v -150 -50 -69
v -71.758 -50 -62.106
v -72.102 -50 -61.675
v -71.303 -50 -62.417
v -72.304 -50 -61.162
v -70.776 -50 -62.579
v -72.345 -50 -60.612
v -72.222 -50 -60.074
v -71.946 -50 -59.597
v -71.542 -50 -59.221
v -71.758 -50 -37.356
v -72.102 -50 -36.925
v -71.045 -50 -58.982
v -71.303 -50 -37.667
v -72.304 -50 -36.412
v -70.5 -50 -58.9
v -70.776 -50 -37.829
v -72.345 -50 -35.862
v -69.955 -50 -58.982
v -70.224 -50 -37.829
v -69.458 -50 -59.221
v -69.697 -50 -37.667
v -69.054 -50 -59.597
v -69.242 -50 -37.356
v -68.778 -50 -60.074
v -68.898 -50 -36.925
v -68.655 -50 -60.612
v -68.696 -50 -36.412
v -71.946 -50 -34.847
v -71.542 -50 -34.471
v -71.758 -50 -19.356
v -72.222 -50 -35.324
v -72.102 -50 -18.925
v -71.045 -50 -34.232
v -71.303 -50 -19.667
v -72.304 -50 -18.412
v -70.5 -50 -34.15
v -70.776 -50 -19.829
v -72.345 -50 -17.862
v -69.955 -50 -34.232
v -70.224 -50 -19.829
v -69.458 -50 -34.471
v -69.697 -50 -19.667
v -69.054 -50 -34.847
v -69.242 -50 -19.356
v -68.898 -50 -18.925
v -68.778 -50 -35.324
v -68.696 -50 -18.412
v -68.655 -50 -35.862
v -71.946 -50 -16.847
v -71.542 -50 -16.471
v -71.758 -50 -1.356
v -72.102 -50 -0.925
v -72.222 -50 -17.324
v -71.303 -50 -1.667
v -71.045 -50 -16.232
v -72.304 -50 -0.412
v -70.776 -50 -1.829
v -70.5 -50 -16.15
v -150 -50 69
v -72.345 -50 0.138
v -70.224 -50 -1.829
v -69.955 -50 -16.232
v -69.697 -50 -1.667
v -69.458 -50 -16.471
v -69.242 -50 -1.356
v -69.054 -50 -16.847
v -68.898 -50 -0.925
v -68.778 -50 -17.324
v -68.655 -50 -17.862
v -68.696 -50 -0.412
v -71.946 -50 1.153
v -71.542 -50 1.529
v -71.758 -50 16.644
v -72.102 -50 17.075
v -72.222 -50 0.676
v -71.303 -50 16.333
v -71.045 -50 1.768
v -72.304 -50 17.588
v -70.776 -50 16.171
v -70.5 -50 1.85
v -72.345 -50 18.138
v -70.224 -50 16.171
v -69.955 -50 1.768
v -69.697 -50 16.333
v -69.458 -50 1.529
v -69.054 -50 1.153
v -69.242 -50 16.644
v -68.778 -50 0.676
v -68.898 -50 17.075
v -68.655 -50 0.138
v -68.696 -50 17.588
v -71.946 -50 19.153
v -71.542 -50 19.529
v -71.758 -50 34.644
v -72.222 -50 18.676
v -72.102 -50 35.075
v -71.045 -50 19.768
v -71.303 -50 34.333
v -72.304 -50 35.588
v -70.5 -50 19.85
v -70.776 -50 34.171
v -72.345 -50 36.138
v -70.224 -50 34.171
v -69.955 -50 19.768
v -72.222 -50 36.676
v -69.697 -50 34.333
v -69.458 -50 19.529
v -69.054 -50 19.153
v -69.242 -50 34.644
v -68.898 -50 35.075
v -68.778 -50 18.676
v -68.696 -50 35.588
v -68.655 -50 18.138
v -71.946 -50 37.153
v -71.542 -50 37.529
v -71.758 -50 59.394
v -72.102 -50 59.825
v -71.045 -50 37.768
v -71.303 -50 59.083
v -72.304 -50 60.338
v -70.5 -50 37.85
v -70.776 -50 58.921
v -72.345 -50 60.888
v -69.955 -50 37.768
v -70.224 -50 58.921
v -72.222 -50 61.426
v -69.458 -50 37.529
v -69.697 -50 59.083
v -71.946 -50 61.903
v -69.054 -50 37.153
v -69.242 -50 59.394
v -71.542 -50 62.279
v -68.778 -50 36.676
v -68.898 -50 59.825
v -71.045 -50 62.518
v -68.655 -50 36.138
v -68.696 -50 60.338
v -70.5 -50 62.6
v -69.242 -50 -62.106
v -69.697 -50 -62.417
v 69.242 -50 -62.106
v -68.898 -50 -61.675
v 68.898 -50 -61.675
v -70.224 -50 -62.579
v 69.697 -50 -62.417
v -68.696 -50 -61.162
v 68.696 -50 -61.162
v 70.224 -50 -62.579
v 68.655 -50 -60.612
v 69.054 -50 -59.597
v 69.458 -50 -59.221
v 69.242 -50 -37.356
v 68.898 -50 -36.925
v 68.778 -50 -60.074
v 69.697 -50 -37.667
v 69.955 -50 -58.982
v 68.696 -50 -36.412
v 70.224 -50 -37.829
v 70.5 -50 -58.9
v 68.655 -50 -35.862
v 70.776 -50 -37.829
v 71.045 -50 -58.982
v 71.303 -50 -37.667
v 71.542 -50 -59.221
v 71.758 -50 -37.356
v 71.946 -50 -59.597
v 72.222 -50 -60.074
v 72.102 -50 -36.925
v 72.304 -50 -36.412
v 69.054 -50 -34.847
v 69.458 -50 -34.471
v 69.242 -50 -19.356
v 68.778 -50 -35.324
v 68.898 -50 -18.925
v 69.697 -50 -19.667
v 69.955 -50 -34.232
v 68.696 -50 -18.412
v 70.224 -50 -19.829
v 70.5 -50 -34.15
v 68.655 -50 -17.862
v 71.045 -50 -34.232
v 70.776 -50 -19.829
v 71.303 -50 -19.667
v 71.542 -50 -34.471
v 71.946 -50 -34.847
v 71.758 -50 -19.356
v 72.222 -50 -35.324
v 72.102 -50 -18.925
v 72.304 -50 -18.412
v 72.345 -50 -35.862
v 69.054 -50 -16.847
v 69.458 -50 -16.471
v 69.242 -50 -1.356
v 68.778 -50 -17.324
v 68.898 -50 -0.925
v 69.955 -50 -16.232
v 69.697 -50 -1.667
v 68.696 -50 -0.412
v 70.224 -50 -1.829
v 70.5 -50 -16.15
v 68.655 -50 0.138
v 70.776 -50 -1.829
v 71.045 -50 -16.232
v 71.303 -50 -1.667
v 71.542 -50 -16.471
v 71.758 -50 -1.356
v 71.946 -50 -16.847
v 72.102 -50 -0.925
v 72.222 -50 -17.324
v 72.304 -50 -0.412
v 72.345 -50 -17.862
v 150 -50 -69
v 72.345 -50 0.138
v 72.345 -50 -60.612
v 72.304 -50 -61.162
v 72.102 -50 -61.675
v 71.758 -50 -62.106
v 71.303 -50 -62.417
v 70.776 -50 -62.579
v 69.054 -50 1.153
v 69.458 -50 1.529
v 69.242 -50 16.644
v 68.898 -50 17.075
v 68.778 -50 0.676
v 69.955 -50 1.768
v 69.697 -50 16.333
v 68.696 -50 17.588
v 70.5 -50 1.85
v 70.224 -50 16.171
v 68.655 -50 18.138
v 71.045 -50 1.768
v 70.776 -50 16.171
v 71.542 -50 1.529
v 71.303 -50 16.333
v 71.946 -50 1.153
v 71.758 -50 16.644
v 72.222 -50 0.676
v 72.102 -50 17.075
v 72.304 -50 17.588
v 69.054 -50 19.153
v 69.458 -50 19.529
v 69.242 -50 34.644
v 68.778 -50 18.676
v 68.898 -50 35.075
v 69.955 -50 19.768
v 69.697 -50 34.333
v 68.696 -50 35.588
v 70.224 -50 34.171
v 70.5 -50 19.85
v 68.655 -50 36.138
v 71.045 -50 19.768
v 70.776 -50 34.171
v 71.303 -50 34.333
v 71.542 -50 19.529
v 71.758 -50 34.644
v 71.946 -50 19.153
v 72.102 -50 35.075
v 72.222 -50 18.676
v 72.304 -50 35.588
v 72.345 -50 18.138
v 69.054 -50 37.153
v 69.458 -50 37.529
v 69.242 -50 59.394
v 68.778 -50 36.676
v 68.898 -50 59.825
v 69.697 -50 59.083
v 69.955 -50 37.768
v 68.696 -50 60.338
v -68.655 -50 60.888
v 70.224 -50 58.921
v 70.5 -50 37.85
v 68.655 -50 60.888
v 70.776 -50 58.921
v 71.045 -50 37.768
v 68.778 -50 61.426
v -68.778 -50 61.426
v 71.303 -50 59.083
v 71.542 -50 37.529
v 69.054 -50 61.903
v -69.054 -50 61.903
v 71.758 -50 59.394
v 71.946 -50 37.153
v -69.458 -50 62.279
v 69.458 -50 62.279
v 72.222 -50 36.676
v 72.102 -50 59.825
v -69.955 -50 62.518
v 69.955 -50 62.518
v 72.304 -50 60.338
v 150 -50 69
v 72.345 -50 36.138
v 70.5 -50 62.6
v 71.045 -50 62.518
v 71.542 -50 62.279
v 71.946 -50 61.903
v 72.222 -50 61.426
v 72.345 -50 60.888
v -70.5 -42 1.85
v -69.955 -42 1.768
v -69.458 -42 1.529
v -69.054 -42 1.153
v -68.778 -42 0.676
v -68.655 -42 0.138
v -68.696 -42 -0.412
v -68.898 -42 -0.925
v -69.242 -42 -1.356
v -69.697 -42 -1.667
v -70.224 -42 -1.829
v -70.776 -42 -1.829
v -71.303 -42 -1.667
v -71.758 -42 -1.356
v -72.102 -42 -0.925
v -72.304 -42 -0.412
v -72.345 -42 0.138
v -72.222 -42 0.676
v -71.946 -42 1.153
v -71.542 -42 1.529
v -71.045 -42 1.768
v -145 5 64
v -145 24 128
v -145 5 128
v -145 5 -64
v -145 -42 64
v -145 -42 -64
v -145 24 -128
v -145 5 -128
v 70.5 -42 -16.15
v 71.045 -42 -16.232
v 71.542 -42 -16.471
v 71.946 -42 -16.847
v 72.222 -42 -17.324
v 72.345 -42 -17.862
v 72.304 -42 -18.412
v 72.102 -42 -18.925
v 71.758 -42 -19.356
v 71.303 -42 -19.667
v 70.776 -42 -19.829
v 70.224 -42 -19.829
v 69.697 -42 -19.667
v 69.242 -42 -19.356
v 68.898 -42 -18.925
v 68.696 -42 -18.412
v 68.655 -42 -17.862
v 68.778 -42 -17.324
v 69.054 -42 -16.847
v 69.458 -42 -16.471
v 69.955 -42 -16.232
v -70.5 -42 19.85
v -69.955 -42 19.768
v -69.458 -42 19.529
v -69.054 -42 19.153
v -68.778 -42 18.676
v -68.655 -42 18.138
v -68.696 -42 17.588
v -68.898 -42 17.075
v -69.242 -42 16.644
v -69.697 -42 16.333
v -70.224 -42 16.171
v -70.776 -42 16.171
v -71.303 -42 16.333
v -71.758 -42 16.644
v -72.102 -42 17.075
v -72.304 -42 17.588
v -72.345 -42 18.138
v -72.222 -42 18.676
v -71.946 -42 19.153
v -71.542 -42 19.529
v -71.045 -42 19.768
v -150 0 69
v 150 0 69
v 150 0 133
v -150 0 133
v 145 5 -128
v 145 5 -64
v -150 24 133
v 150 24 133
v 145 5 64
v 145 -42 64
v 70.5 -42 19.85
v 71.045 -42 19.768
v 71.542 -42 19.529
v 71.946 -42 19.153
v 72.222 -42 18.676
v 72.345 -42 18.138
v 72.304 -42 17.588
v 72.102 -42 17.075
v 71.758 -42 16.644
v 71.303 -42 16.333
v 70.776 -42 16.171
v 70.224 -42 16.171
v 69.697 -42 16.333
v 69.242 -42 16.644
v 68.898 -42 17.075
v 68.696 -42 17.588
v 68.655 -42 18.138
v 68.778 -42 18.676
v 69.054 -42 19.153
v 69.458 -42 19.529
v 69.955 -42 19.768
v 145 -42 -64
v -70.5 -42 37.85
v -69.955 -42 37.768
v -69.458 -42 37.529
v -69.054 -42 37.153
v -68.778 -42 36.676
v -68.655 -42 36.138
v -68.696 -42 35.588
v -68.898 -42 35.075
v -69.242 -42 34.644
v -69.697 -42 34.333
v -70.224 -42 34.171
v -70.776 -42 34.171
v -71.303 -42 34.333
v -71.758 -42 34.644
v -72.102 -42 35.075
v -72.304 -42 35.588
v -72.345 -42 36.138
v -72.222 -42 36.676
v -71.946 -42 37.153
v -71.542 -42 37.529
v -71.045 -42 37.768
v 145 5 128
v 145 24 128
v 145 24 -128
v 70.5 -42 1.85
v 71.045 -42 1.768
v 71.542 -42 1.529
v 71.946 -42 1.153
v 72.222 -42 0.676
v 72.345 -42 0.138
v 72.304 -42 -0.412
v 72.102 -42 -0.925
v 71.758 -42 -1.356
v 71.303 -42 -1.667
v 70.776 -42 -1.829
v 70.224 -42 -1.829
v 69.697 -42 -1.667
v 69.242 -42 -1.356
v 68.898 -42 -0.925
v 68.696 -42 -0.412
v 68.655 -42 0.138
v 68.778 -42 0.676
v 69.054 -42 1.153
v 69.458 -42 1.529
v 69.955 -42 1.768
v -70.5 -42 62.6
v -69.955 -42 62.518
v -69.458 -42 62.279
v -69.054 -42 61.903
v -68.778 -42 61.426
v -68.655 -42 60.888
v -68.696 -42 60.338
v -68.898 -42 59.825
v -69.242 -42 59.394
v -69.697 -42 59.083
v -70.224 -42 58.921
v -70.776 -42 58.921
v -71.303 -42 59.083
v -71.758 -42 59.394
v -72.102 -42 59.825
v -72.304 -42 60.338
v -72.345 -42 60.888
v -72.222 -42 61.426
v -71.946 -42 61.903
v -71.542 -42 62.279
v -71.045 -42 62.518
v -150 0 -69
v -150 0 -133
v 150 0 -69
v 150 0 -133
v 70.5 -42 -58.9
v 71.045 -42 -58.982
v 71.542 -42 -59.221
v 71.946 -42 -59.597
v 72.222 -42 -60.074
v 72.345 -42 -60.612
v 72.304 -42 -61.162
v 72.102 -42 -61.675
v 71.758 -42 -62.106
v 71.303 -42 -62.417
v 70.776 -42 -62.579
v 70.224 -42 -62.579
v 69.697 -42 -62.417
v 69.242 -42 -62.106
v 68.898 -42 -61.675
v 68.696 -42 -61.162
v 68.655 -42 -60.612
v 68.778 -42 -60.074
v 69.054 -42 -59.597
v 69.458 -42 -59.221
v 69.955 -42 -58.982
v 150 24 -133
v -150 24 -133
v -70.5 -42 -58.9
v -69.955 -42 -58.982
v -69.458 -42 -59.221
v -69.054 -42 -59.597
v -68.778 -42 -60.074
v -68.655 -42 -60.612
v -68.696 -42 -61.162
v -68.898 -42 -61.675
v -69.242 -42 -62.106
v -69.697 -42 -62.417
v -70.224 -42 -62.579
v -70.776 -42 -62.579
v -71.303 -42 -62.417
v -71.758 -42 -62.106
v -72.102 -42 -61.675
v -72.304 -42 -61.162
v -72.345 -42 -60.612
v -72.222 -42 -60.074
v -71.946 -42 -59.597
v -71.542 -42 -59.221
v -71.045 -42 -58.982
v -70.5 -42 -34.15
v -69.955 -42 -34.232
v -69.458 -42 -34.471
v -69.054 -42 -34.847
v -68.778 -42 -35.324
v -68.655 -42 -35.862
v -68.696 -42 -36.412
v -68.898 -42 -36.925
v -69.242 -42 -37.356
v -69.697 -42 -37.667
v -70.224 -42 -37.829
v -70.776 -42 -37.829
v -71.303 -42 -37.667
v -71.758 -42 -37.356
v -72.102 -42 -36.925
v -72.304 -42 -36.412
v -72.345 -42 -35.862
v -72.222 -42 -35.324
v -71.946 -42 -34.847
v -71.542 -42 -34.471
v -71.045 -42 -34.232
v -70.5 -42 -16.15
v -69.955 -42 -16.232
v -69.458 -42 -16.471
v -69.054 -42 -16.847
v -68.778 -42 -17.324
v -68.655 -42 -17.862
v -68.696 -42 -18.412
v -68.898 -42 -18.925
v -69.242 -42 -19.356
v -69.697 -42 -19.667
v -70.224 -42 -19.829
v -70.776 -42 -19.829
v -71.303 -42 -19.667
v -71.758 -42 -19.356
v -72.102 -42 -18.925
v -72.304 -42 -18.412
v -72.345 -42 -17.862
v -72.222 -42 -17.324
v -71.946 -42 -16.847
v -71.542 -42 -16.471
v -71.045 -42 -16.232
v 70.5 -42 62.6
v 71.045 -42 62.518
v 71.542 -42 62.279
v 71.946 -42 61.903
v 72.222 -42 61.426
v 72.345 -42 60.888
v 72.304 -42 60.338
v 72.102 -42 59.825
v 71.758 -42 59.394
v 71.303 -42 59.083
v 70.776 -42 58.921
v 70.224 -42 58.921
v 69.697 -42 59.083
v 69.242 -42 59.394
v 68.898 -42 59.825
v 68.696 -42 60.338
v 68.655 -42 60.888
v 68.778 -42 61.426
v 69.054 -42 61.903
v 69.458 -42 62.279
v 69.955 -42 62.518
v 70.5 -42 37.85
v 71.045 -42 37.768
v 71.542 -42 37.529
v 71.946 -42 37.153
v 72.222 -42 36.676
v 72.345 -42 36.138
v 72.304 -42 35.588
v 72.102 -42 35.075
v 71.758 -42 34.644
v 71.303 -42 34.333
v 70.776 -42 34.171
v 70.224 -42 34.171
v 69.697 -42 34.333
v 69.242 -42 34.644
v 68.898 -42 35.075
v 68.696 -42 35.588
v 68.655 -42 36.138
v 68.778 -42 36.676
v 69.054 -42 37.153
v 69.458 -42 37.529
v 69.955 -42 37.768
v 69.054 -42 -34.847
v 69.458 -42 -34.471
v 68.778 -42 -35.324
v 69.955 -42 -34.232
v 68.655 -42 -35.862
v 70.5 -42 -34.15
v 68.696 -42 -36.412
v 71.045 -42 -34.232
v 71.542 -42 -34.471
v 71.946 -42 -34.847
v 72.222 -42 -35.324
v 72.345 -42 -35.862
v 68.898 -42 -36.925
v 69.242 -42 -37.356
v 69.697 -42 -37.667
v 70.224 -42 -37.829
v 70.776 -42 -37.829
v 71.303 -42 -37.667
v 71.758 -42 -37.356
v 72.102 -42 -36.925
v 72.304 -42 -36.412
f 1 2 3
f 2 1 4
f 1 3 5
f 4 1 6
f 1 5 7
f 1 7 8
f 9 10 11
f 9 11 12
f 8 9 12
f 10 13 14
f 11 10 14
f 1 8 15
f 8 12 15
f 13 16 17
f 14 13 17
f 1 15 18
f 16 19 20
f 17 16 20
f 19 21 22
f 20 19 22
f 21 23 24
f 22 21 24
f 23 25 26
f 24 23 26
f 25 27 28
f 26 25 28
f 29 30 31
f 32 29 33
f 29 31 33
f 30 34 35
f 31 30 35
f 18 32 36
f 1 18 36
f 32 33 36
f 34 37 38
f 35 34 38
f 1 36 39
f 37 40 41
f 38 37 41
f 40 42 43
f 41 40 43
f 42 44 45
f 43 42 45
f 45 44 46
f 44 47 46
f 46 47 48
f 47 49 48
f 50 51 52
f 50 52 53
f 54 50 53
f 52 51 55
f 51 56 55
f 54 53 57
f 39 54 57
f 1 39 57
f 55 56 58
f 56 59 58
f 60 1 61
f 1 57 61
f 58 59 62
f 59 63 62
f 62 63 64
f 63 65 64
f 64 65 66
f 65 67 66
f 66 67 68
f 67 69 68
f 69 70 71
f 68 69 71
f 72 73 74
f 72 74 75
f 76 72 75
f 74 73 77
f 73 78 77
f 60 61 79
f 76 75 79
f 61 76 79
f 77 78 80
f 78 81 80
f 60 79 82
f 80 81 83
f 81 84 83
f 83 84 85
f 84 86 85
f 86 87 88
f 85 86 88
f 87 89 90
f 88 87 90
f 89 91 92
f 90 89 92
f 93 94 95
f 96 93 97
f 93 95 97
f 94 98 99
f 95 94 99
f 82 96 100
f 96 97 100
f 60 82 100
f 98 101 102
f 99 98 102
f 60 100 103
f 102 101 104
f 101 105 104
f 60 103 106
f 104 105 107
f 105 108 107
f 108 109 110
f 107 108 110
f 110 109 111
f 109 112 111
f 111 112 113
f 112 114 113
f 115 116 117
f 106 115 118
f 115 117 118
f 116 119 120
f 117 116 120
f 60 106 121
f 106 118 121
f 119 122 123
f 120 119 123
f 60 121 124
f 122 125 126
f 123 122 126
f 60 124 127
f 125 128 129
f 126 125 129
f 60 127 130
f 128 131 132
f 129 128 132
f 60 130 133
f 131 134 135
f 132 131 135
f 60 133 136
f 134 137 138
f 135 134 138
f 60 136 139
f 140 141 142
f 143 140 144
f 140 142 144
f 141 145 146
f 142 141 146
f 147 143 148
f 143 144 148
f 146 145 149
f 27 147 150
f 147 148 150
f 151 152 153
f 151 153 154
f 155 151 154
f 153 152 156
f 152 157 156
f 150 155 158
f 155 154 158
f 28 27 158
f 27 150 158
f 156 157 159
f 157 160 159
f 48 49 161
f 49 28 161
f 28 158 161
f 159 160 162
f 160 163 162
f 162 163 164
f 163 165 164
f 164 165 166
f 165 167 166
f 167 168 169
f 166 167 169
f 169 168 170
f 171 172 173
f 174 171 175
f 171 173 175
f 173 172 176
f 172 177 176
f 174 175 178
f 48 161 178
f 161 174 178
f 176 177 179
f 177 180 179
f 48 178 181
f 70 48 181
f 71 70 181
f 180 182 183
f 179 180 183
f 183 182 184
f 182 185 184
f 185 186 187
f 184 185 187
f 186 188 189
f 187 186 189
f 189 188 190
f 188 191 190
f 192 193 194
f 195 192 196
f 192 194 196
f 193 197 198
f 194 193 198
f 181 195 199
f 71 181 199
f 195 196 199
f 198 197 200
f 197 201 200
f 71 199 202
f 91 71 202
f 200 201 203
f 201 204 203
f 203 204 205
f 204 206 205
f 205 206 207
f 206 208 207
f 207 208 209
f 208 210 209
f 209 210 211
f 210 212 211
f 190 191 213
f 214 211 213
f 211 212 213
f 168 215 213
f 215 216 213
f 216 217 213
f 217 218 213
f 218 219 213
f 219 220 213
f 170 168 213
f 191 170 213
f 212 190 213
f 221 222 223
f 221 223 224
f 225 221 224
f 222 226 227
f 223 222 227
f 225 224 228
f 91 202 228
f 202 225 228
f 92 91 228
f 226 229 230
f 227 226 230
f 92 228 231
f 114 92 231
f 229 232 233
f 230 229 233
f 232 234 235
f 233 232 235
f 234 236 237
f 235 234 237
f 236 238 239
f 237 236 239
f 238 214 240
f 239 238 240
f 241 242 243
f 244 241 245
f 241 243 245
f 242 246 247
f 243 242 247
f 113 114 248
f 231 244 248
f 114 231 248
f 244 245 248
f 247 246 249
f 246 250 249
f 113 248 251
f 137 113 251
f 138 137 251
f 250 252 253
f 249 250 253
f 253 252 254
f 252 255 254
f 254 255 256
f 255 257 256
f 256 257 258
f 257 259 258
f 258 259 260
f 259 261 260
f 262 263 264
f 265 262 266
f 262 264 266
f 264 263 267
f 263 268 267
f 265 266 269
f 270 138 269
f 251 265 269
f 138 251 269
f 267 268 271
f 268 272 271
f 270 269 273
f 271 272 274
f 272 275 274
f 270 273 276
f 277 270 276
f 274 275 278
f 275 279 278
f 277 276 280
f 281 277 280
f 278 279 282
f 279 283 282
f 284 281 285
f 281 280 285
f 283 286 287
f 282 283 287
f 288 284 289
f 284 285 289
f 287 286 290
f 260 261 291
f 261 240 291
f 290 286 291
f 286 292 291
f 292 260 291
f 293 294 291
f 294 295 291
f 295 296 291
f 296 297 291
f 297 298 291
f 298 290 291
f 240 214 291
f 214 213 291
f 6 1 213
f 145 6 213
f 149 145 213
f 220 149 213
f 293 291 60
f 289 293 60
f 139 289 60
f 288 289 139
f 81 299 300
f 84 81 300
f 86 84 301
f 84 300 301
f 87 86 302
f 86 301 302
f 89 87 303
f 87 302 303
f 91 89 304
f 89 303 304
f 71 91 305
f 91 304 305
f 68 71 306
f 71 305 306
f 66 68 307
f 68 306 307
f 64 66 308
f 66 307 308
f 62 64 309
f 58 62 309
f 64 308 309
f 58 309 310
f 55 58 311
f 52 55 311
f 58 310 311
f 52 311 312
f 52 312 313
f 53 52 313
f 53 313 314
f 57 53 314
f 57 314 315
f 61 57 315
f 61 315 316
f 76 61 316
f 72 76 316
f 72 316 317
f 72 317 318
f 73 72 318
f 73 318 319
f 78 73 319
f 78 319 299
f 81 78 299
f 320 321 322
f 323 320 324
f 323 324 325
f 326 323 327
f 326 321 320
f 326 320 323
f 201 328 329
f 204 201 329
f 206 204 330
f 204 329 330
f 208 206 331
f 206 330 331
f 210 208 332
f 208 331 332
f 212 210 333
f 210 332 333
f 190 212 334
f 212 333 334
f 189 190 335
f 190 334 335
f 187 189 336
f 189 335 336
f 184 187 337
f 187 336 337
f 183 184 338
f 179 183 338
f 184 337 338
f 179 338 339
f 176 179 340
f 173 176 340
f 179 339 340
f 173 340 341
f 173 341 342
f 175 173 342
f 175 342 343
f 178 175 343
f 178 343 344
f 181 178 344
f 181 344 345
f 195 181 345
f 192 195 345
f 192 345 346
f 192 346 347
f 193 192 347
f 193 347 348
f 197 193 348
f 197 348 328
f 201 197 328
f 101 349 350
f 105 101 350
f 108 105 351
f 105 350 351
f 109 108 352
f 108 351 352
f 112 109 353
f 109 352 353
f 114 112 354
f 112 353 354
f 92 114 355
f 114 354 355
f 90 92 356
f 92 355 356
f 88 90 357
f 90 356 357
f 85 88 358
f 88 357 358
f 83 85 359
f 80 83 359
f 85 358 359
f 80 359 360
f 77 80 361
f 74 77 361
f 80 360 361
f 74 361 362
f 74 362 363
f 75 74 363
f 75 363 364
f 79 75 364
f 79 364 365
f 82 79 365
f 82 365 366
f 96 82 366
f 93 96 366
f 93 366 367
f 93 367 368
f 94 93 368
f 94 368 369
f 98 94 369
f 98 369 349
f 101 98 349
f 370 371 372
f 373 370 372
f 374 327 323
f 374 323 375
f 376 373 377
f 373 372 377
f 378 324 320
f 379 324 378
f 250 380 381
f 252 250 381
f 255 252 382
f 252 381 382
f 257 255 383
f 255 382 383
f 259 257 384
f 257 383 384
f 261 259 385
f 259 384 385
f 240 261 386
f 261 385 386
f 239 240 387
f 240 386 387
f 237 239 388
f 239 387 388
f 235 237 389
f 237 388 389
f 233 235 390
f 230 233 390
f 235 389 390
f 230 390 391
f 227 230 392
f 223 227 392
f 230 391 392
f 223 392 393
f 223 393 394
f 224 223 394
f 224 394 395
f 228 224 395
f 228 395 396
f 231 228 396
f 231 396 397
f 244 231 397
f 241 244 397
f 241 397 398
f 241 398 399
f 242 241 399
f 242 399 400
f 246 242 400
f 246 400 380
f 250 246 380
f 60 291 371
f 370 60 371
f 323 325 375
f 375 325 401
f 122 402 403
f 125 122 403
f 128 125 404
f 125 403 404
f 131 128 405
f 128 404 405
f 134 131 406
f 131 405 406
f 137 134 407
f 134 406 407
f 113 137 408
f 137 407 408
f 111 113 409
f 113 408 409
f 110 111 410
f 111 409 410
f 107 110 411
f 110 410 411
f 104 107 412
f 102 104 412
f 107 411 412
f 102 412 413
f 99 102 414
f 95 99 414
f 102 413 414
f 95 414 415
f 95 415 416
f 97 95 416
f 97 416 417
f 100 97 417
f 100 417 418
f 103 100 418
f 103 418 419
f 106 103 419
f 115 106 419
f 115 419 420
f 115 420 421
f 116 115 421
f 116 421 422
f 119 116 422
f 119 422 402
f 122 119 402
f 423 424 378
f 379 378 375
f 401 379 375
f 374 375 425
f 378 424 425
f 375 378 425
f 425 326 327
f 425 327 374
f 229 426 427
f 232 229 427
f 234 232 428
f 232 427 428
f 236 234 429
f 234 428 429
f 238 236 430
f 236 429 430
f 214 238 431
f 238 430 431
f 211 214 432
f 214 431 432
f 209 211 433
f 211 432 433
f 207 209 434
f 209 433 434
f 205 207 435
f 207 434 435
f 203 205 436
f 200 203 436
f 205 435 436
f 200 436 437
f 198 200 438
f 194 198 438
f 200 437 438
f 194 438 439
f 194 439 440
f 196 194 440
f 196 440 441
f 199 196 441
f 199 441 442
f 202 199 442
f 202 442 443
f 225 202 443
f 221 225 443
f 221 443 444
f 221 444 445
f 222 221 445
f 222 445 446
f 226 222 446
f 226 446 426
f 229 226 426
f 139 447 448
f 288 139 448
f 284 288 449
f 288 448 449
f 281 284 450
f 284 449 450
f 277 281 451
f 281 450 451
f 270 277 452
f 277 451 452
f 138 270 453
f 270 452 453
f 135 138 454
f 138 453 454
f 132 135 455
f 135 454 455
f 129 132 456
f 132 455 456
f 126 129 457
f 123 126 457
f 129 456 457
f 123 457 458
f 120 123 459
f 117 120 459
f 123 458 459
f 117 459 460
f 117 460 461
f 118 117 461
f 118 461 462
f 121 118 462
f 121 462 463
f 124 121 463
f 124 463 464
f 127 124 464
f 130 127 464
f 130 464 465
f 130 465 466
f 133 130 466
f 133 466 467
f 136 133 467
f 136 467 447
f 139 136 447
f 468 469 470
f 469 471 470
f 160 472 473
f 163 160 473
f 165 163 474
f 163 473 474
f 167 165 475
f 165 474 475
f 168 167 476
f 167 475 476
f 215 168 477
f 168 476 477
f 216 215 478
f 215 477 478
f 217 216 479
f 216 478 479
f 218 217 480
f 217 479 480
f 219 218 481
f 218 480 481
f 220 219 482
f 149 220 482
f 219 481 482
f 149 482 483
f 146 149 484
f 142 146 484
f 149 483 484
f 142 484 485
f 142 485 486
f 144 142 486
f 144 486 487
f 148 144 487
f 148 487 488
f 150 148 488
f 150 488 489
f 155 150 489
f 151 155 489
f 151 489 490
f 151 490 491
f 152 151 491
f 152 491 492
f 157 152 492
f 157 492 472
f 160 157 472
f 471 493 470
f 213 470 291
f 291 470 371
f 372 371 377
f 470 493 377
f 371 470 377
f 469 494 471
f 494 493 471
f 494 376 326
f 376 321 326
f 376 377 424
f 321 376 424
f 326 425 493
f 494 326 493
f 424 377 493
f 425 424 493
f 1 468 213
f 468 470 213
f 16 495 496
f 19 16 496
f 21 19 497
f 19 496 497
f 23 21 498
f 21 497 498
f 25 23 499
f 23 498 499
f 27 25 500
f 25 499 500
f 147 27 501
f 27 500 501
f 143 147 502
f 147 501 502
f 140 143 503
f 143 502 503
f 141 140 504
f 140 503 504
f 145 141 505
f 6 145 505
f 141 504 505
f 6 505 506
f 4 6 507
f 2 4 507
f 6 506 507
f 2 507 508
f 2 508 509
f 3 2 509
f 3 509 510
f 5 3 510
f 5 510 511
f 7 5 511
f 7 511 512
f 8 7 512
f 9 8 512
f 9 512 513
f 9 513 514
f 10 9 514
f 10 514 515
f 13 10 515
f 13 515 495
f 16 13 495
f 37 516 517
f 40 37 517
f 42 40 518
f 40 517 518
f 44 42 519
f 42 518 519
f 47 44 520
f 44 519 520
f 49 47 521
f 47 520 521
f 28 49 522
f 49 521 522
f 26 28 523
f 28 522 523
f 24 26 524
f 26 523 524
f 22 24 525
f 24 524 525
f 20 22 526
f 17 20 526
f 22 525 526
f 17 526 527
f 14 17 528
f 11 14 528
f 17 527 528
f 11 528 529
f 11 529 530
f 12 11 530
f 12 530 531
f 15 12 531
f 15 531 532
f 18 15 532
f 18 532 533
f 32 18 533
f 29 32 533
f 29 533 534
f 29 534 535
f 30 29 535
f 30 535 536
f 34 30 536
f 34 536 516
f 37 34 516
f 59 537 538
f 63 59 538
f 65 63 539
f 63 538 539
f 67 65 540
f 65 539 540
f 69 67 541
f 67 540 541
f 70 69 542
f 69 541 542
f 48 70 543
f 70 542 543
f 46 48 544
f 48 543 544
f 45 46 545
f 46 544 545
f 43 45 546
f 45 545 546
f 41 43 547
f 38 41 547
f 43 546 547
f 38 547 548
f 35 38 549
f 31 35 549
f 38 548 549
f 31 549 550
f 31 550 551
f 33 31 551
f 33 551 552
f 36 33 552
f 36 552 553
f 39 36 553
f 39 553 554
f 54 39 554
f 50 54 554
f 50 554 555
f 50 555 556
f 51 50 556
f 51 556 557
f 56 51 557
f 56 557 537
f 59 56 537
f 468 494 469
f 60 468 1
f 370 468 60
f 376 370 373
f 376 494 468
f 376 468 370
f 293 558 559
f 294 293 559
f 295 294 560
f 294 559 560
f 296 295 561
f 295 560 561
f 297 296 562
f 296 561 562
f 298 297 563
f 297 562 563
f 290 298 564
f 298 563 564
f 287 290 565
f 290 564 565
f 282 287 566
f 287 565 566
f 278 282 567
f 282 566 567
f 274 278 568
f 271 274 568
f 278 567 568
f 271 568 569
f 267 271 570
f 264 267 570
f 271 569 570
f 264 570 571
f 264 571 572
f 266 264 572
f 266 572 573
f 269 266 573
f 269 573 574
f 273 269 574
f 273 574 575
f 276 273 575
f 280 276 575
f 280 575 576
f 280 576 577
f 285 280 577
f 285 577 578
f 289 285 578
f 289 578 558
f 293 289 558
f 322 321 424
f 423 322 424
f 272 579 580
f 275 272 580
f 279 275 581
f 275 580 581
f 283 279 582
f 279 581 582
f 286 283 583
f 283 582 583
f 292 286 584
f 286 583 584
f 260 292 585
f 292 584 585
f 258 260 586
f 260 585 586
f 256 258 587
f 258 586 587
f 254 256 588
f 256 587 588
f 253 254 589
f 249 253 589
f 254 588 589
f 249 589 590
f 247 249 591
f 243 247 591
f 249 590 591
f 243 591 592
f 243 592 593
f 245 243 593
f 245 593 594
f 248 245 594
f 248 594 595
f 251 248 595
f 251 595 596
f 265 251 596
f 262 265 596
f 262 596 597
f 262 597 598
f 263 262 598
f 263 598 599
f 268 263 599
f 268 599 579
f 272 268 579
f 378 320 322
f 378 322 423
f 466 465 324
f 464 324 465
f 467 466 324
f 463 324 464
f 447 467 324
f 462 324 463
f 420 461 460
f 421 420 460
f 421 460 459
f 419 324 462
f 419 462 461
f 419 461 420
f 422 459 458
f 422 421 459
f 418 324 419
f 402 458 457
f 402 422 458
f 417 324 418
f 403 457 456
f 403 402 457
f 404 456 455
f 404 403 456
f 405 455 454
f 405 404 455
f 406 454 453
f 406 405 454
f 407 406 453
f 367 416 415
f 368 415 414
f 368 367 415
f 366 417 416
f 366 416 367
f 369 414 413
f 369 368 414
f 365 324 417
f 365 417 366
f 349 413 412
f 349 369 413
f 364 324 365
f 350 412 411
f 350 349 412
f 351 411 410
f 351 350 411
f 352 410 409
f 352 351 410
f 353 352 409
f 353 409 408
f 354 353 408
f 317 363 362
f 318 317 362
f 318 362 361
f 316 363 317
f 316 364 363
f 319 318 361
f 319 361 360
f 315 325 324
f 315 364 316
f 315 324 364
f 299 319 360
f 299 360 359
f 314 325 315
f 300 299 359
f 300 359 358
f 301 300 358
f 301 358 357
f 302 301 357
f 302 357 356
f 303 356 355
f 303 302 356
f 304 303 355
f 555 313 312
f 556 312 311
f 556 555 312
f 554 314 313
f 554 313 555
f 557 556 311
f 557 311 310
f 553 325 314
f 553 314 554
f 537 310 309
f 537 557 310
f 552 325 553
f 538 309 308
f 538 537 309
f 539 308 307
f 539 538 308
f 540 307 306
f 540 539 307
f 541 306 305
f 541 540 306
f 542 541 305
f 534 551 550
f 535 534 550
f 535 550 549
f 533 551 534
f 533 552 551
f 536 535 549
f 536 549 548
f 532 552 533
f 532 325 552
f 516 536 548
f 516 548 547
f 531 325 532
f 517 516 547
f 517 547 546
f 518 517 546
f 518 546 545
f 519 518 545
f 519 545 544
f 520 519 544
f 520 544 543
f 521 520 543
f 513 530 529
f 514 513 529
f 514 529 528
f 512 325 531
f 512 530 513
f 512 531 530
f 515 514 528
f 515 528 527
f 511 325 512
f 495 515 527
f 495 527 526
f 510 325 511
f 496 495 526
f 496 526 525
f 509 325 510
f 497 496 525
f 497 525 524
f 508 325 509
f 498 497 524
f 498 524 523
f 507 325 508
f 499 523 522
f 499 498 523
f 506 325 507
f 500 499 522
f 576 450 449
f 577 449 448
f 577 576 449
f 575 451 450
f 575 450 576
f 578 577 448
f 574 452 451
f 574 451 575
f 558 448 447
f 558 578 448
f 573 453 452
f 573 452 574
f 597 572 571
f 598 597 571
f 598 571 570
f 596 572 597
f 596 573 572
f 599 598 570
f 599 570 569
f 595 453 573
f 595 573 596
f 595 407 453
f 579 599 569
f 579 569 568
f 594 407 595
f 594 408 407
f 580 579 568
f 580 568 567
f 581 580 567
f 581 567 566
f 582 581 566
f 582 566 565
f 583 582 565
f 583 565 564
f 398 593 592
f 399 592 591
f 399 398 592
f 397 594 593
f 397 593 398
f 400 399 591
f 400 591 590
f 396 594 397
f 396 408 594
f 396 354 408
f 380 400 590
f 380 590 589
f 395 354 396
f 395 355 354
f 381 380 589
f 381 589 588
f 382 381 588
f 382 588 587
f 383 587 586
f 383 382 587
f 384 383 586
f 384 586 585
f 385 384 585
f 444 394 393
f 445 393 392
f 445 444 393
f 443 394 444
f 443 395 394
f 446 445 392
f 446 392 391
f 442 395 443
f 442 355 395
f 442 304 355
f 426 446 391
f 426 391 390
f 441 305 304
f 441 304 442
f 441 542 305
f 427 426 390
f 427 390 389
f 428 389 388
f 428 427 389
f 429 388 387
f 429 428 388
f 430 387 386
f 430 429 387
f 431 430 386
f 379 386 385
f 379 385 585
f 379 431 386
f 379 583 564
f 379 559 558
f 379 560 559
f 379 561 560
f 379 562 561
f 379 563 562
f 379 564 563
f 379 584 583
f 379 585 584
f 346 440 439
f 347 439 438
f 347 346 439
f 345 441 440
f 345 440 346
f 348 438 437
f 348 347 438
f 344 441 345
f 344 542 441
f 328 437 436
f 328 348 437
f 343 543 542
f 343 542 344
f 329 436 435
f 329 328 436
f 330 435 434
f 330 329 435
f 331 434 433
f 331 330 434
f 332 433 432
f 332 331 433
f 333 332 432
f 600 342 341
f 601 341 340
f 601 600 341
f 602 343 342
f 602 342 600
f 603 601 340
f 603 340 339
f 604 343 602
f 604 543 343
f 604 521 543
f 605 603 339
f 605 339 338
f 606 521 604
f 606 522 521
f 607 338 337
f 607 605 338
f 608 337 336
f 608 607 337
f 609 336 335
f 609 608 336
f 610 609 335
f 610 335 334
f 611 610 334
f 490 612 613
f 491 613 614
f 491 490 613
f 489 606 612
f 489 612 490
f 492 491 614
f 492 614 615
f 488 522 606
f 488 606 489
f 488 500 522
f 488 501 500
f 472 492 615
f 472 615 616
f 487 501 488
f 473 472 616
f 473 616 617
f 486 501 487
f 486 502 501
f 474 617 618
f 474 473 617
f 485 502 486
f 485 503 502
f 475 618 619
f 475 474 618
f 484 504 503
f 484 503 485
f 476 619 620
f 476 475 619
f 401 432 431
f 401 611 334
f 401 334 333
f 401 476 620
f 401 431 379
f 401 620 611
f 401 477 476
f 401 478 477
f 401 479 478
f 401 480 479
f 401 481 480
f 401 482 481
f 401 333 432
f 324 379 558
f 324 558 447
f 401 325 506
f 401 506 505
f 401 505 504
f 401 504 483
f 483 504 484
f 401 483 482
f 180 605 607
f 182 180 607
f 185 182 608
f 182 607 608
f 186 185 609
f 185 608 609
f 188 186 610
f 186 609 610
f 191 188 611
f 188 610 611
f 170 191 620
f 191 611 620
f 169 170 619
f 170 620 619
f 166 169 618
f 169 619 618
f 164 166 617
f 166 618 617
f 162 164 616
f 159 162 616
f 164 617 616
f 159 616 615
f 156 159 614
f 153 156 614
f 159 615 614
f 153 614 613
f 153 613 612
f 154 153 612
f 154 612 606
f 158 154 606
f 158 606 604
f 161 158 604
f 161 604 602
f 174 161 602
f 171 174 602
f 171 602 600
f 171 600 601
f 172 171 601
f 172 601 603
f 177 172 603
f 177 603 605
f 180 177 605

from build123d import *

# Parameters (mm, degrees)
BOSS_EXTRUDE1_DEPTH = 150
SHELL1_START        = -42
SHELL1_OUTLINE_W    = 290
SHELL1_OUTLINE_H    = 128
SHELL1_DEPTH        = 61
SHELL1_START_2      = 5
SHELL1_2_OUTLINE_W  = 290
SHELL1_2_OUTLINE_H  = 64
SHELL1_2_DEPTH      = 14
SKETCH2_R           = 1.85
CUT_EXTRUDE2_DEPTH  = 207.613165118
SKETCH3_W           = 290
SKETCH3_H           = 256
CUT_EXTRUDE3_DEPTH  = 5


# Read off the part's stored shape, not the designer's step: Shell1
with BuildPart() as part:
    # Sketch1 → Boss-Extrude1 (new, symmetric)
    with BuildSketch(Plane(origin=(0, 0, 0), x_dir=(0, 0, -1), z_dir=(1, 0, 0))):
        Polygon((-69, 0), (-133, 0), (-133, 24), (133, 24), (133, 0), (69, 0), (69, -50), (-69, -50), align=None)
    extrude(amount=BOSS_EXTRUDE1_DEPTH, both=True)

    # Shell1 outline → Shell1 (cut)
    with BuildSketch(Plane(origin=(0, 0, 0), x_dir=(1, 0, 0), z_dir=(0, 1, 0)).offset(SHELL1_START)):
        Rectangle(SHELL1_OUTLINE_W, SHELL1_OUTLINE_H)
    extrude(amount=SHELL1_DEPTH, mode=Mode.SUBTRACT)

    # Shell1 2 outline → Shell1 2 (cut)
    with BuildSketch(Plane(origin=(0, 0, 0), x_dir=(1, 0, 0), z_dir=(0, 1, 0)).offset(SHELL1_START_2)):
        with Locations((0, 96)):
            Rectangle(SHELL1_2_OUTLINE_W, SHELL1_2_OUTLINE_H)
        with Locations((0, -96)):
            Rectangle(SHELL1_2_OUTLINE_W, SHELL1_2_OUTLINE_H)
    extrude(amount=SHELL1_2_DEPTH, mode=Mode.SUBTRACT)

    # Sketch2 → Cut-Extrude2 (cut, through all)
    with BuildSketch(Plane(origin=(0, 0, 0), x_dir=(1, 0, 0), z_dir=(0, 1, 0))):
        with Locations(Location((70.5, 0, 0), (0, 0, 270))):
            Circle(SKETCH2_R)
        with Locations(Location((70.5, 18, 0), (0, 0, 270))):
            Circle(SKETCH2_R)
        with Locations(Location((70.5, 36, 0), (0, 0, 270))):
            Circle(SKETCH2_R)
        with Locations(Location((70.5, -18, 0), (0, 0, 270))):
            Circle(SKETCH2_R)
        with Locations(Location((70.5, -36, 0), (0, 0, 270))):
            Circle(SKETCH2_R)
        with Locations(Location((70.5, -60.75, 0), (0, 0, 270))):
            Circle(SKETCH2_R)
        with Locations(Location((70.5, 60.75, 0), (0, 0, 270))):
            Circle(SKETCH2_R)
        with Locations(Location((-70.5, -60.75, 0), (0, 0, 270))):
            Circle(SKETCH2_R)
        with Locations(Location((-70.5, -36, 0), (0, 0, 270))):
            Circle(SKETCH2_R)
        with Locations(Location((-70.5, -18, 0), (0, 0, 270))):
            Circle(SKETCH2_R)
        with Locations(Location((-70.5, 0, 0), (0, 0, 270))):
            Circle(SKETCH2_R)
        with Locations(Location((-70.5, 18, 0), (0, 0, 270))):
            Circle(SKETCH2_R)
        with Locations(Location((-70.5, 36, 0), (0, 0, 270))):
            Circle(SKETCH2_R)
        with Locations(Location((-70.5, 60.75, 0), (0, 0, 270))):
            Circle(SKETCH2_R)
    extrude(amount=-CUT_EXTRUDE2_DEPTH, mode=Mode.SUBTRACT)

    # Sketch3 → Cut-Extrude3 (cut)
    with BuildSketch(Plane(origin=(0, 24, 0), x_dir=(1, 0, 0), z_dir=(0, 1, 0))):
        Rectangle(SKETCH3_W, SKETCH3_H)
    extrude(amount=-CUT_EXTRUDE3_DEPTH, mode=Mode.SUBTRACT)


solid = part.part
